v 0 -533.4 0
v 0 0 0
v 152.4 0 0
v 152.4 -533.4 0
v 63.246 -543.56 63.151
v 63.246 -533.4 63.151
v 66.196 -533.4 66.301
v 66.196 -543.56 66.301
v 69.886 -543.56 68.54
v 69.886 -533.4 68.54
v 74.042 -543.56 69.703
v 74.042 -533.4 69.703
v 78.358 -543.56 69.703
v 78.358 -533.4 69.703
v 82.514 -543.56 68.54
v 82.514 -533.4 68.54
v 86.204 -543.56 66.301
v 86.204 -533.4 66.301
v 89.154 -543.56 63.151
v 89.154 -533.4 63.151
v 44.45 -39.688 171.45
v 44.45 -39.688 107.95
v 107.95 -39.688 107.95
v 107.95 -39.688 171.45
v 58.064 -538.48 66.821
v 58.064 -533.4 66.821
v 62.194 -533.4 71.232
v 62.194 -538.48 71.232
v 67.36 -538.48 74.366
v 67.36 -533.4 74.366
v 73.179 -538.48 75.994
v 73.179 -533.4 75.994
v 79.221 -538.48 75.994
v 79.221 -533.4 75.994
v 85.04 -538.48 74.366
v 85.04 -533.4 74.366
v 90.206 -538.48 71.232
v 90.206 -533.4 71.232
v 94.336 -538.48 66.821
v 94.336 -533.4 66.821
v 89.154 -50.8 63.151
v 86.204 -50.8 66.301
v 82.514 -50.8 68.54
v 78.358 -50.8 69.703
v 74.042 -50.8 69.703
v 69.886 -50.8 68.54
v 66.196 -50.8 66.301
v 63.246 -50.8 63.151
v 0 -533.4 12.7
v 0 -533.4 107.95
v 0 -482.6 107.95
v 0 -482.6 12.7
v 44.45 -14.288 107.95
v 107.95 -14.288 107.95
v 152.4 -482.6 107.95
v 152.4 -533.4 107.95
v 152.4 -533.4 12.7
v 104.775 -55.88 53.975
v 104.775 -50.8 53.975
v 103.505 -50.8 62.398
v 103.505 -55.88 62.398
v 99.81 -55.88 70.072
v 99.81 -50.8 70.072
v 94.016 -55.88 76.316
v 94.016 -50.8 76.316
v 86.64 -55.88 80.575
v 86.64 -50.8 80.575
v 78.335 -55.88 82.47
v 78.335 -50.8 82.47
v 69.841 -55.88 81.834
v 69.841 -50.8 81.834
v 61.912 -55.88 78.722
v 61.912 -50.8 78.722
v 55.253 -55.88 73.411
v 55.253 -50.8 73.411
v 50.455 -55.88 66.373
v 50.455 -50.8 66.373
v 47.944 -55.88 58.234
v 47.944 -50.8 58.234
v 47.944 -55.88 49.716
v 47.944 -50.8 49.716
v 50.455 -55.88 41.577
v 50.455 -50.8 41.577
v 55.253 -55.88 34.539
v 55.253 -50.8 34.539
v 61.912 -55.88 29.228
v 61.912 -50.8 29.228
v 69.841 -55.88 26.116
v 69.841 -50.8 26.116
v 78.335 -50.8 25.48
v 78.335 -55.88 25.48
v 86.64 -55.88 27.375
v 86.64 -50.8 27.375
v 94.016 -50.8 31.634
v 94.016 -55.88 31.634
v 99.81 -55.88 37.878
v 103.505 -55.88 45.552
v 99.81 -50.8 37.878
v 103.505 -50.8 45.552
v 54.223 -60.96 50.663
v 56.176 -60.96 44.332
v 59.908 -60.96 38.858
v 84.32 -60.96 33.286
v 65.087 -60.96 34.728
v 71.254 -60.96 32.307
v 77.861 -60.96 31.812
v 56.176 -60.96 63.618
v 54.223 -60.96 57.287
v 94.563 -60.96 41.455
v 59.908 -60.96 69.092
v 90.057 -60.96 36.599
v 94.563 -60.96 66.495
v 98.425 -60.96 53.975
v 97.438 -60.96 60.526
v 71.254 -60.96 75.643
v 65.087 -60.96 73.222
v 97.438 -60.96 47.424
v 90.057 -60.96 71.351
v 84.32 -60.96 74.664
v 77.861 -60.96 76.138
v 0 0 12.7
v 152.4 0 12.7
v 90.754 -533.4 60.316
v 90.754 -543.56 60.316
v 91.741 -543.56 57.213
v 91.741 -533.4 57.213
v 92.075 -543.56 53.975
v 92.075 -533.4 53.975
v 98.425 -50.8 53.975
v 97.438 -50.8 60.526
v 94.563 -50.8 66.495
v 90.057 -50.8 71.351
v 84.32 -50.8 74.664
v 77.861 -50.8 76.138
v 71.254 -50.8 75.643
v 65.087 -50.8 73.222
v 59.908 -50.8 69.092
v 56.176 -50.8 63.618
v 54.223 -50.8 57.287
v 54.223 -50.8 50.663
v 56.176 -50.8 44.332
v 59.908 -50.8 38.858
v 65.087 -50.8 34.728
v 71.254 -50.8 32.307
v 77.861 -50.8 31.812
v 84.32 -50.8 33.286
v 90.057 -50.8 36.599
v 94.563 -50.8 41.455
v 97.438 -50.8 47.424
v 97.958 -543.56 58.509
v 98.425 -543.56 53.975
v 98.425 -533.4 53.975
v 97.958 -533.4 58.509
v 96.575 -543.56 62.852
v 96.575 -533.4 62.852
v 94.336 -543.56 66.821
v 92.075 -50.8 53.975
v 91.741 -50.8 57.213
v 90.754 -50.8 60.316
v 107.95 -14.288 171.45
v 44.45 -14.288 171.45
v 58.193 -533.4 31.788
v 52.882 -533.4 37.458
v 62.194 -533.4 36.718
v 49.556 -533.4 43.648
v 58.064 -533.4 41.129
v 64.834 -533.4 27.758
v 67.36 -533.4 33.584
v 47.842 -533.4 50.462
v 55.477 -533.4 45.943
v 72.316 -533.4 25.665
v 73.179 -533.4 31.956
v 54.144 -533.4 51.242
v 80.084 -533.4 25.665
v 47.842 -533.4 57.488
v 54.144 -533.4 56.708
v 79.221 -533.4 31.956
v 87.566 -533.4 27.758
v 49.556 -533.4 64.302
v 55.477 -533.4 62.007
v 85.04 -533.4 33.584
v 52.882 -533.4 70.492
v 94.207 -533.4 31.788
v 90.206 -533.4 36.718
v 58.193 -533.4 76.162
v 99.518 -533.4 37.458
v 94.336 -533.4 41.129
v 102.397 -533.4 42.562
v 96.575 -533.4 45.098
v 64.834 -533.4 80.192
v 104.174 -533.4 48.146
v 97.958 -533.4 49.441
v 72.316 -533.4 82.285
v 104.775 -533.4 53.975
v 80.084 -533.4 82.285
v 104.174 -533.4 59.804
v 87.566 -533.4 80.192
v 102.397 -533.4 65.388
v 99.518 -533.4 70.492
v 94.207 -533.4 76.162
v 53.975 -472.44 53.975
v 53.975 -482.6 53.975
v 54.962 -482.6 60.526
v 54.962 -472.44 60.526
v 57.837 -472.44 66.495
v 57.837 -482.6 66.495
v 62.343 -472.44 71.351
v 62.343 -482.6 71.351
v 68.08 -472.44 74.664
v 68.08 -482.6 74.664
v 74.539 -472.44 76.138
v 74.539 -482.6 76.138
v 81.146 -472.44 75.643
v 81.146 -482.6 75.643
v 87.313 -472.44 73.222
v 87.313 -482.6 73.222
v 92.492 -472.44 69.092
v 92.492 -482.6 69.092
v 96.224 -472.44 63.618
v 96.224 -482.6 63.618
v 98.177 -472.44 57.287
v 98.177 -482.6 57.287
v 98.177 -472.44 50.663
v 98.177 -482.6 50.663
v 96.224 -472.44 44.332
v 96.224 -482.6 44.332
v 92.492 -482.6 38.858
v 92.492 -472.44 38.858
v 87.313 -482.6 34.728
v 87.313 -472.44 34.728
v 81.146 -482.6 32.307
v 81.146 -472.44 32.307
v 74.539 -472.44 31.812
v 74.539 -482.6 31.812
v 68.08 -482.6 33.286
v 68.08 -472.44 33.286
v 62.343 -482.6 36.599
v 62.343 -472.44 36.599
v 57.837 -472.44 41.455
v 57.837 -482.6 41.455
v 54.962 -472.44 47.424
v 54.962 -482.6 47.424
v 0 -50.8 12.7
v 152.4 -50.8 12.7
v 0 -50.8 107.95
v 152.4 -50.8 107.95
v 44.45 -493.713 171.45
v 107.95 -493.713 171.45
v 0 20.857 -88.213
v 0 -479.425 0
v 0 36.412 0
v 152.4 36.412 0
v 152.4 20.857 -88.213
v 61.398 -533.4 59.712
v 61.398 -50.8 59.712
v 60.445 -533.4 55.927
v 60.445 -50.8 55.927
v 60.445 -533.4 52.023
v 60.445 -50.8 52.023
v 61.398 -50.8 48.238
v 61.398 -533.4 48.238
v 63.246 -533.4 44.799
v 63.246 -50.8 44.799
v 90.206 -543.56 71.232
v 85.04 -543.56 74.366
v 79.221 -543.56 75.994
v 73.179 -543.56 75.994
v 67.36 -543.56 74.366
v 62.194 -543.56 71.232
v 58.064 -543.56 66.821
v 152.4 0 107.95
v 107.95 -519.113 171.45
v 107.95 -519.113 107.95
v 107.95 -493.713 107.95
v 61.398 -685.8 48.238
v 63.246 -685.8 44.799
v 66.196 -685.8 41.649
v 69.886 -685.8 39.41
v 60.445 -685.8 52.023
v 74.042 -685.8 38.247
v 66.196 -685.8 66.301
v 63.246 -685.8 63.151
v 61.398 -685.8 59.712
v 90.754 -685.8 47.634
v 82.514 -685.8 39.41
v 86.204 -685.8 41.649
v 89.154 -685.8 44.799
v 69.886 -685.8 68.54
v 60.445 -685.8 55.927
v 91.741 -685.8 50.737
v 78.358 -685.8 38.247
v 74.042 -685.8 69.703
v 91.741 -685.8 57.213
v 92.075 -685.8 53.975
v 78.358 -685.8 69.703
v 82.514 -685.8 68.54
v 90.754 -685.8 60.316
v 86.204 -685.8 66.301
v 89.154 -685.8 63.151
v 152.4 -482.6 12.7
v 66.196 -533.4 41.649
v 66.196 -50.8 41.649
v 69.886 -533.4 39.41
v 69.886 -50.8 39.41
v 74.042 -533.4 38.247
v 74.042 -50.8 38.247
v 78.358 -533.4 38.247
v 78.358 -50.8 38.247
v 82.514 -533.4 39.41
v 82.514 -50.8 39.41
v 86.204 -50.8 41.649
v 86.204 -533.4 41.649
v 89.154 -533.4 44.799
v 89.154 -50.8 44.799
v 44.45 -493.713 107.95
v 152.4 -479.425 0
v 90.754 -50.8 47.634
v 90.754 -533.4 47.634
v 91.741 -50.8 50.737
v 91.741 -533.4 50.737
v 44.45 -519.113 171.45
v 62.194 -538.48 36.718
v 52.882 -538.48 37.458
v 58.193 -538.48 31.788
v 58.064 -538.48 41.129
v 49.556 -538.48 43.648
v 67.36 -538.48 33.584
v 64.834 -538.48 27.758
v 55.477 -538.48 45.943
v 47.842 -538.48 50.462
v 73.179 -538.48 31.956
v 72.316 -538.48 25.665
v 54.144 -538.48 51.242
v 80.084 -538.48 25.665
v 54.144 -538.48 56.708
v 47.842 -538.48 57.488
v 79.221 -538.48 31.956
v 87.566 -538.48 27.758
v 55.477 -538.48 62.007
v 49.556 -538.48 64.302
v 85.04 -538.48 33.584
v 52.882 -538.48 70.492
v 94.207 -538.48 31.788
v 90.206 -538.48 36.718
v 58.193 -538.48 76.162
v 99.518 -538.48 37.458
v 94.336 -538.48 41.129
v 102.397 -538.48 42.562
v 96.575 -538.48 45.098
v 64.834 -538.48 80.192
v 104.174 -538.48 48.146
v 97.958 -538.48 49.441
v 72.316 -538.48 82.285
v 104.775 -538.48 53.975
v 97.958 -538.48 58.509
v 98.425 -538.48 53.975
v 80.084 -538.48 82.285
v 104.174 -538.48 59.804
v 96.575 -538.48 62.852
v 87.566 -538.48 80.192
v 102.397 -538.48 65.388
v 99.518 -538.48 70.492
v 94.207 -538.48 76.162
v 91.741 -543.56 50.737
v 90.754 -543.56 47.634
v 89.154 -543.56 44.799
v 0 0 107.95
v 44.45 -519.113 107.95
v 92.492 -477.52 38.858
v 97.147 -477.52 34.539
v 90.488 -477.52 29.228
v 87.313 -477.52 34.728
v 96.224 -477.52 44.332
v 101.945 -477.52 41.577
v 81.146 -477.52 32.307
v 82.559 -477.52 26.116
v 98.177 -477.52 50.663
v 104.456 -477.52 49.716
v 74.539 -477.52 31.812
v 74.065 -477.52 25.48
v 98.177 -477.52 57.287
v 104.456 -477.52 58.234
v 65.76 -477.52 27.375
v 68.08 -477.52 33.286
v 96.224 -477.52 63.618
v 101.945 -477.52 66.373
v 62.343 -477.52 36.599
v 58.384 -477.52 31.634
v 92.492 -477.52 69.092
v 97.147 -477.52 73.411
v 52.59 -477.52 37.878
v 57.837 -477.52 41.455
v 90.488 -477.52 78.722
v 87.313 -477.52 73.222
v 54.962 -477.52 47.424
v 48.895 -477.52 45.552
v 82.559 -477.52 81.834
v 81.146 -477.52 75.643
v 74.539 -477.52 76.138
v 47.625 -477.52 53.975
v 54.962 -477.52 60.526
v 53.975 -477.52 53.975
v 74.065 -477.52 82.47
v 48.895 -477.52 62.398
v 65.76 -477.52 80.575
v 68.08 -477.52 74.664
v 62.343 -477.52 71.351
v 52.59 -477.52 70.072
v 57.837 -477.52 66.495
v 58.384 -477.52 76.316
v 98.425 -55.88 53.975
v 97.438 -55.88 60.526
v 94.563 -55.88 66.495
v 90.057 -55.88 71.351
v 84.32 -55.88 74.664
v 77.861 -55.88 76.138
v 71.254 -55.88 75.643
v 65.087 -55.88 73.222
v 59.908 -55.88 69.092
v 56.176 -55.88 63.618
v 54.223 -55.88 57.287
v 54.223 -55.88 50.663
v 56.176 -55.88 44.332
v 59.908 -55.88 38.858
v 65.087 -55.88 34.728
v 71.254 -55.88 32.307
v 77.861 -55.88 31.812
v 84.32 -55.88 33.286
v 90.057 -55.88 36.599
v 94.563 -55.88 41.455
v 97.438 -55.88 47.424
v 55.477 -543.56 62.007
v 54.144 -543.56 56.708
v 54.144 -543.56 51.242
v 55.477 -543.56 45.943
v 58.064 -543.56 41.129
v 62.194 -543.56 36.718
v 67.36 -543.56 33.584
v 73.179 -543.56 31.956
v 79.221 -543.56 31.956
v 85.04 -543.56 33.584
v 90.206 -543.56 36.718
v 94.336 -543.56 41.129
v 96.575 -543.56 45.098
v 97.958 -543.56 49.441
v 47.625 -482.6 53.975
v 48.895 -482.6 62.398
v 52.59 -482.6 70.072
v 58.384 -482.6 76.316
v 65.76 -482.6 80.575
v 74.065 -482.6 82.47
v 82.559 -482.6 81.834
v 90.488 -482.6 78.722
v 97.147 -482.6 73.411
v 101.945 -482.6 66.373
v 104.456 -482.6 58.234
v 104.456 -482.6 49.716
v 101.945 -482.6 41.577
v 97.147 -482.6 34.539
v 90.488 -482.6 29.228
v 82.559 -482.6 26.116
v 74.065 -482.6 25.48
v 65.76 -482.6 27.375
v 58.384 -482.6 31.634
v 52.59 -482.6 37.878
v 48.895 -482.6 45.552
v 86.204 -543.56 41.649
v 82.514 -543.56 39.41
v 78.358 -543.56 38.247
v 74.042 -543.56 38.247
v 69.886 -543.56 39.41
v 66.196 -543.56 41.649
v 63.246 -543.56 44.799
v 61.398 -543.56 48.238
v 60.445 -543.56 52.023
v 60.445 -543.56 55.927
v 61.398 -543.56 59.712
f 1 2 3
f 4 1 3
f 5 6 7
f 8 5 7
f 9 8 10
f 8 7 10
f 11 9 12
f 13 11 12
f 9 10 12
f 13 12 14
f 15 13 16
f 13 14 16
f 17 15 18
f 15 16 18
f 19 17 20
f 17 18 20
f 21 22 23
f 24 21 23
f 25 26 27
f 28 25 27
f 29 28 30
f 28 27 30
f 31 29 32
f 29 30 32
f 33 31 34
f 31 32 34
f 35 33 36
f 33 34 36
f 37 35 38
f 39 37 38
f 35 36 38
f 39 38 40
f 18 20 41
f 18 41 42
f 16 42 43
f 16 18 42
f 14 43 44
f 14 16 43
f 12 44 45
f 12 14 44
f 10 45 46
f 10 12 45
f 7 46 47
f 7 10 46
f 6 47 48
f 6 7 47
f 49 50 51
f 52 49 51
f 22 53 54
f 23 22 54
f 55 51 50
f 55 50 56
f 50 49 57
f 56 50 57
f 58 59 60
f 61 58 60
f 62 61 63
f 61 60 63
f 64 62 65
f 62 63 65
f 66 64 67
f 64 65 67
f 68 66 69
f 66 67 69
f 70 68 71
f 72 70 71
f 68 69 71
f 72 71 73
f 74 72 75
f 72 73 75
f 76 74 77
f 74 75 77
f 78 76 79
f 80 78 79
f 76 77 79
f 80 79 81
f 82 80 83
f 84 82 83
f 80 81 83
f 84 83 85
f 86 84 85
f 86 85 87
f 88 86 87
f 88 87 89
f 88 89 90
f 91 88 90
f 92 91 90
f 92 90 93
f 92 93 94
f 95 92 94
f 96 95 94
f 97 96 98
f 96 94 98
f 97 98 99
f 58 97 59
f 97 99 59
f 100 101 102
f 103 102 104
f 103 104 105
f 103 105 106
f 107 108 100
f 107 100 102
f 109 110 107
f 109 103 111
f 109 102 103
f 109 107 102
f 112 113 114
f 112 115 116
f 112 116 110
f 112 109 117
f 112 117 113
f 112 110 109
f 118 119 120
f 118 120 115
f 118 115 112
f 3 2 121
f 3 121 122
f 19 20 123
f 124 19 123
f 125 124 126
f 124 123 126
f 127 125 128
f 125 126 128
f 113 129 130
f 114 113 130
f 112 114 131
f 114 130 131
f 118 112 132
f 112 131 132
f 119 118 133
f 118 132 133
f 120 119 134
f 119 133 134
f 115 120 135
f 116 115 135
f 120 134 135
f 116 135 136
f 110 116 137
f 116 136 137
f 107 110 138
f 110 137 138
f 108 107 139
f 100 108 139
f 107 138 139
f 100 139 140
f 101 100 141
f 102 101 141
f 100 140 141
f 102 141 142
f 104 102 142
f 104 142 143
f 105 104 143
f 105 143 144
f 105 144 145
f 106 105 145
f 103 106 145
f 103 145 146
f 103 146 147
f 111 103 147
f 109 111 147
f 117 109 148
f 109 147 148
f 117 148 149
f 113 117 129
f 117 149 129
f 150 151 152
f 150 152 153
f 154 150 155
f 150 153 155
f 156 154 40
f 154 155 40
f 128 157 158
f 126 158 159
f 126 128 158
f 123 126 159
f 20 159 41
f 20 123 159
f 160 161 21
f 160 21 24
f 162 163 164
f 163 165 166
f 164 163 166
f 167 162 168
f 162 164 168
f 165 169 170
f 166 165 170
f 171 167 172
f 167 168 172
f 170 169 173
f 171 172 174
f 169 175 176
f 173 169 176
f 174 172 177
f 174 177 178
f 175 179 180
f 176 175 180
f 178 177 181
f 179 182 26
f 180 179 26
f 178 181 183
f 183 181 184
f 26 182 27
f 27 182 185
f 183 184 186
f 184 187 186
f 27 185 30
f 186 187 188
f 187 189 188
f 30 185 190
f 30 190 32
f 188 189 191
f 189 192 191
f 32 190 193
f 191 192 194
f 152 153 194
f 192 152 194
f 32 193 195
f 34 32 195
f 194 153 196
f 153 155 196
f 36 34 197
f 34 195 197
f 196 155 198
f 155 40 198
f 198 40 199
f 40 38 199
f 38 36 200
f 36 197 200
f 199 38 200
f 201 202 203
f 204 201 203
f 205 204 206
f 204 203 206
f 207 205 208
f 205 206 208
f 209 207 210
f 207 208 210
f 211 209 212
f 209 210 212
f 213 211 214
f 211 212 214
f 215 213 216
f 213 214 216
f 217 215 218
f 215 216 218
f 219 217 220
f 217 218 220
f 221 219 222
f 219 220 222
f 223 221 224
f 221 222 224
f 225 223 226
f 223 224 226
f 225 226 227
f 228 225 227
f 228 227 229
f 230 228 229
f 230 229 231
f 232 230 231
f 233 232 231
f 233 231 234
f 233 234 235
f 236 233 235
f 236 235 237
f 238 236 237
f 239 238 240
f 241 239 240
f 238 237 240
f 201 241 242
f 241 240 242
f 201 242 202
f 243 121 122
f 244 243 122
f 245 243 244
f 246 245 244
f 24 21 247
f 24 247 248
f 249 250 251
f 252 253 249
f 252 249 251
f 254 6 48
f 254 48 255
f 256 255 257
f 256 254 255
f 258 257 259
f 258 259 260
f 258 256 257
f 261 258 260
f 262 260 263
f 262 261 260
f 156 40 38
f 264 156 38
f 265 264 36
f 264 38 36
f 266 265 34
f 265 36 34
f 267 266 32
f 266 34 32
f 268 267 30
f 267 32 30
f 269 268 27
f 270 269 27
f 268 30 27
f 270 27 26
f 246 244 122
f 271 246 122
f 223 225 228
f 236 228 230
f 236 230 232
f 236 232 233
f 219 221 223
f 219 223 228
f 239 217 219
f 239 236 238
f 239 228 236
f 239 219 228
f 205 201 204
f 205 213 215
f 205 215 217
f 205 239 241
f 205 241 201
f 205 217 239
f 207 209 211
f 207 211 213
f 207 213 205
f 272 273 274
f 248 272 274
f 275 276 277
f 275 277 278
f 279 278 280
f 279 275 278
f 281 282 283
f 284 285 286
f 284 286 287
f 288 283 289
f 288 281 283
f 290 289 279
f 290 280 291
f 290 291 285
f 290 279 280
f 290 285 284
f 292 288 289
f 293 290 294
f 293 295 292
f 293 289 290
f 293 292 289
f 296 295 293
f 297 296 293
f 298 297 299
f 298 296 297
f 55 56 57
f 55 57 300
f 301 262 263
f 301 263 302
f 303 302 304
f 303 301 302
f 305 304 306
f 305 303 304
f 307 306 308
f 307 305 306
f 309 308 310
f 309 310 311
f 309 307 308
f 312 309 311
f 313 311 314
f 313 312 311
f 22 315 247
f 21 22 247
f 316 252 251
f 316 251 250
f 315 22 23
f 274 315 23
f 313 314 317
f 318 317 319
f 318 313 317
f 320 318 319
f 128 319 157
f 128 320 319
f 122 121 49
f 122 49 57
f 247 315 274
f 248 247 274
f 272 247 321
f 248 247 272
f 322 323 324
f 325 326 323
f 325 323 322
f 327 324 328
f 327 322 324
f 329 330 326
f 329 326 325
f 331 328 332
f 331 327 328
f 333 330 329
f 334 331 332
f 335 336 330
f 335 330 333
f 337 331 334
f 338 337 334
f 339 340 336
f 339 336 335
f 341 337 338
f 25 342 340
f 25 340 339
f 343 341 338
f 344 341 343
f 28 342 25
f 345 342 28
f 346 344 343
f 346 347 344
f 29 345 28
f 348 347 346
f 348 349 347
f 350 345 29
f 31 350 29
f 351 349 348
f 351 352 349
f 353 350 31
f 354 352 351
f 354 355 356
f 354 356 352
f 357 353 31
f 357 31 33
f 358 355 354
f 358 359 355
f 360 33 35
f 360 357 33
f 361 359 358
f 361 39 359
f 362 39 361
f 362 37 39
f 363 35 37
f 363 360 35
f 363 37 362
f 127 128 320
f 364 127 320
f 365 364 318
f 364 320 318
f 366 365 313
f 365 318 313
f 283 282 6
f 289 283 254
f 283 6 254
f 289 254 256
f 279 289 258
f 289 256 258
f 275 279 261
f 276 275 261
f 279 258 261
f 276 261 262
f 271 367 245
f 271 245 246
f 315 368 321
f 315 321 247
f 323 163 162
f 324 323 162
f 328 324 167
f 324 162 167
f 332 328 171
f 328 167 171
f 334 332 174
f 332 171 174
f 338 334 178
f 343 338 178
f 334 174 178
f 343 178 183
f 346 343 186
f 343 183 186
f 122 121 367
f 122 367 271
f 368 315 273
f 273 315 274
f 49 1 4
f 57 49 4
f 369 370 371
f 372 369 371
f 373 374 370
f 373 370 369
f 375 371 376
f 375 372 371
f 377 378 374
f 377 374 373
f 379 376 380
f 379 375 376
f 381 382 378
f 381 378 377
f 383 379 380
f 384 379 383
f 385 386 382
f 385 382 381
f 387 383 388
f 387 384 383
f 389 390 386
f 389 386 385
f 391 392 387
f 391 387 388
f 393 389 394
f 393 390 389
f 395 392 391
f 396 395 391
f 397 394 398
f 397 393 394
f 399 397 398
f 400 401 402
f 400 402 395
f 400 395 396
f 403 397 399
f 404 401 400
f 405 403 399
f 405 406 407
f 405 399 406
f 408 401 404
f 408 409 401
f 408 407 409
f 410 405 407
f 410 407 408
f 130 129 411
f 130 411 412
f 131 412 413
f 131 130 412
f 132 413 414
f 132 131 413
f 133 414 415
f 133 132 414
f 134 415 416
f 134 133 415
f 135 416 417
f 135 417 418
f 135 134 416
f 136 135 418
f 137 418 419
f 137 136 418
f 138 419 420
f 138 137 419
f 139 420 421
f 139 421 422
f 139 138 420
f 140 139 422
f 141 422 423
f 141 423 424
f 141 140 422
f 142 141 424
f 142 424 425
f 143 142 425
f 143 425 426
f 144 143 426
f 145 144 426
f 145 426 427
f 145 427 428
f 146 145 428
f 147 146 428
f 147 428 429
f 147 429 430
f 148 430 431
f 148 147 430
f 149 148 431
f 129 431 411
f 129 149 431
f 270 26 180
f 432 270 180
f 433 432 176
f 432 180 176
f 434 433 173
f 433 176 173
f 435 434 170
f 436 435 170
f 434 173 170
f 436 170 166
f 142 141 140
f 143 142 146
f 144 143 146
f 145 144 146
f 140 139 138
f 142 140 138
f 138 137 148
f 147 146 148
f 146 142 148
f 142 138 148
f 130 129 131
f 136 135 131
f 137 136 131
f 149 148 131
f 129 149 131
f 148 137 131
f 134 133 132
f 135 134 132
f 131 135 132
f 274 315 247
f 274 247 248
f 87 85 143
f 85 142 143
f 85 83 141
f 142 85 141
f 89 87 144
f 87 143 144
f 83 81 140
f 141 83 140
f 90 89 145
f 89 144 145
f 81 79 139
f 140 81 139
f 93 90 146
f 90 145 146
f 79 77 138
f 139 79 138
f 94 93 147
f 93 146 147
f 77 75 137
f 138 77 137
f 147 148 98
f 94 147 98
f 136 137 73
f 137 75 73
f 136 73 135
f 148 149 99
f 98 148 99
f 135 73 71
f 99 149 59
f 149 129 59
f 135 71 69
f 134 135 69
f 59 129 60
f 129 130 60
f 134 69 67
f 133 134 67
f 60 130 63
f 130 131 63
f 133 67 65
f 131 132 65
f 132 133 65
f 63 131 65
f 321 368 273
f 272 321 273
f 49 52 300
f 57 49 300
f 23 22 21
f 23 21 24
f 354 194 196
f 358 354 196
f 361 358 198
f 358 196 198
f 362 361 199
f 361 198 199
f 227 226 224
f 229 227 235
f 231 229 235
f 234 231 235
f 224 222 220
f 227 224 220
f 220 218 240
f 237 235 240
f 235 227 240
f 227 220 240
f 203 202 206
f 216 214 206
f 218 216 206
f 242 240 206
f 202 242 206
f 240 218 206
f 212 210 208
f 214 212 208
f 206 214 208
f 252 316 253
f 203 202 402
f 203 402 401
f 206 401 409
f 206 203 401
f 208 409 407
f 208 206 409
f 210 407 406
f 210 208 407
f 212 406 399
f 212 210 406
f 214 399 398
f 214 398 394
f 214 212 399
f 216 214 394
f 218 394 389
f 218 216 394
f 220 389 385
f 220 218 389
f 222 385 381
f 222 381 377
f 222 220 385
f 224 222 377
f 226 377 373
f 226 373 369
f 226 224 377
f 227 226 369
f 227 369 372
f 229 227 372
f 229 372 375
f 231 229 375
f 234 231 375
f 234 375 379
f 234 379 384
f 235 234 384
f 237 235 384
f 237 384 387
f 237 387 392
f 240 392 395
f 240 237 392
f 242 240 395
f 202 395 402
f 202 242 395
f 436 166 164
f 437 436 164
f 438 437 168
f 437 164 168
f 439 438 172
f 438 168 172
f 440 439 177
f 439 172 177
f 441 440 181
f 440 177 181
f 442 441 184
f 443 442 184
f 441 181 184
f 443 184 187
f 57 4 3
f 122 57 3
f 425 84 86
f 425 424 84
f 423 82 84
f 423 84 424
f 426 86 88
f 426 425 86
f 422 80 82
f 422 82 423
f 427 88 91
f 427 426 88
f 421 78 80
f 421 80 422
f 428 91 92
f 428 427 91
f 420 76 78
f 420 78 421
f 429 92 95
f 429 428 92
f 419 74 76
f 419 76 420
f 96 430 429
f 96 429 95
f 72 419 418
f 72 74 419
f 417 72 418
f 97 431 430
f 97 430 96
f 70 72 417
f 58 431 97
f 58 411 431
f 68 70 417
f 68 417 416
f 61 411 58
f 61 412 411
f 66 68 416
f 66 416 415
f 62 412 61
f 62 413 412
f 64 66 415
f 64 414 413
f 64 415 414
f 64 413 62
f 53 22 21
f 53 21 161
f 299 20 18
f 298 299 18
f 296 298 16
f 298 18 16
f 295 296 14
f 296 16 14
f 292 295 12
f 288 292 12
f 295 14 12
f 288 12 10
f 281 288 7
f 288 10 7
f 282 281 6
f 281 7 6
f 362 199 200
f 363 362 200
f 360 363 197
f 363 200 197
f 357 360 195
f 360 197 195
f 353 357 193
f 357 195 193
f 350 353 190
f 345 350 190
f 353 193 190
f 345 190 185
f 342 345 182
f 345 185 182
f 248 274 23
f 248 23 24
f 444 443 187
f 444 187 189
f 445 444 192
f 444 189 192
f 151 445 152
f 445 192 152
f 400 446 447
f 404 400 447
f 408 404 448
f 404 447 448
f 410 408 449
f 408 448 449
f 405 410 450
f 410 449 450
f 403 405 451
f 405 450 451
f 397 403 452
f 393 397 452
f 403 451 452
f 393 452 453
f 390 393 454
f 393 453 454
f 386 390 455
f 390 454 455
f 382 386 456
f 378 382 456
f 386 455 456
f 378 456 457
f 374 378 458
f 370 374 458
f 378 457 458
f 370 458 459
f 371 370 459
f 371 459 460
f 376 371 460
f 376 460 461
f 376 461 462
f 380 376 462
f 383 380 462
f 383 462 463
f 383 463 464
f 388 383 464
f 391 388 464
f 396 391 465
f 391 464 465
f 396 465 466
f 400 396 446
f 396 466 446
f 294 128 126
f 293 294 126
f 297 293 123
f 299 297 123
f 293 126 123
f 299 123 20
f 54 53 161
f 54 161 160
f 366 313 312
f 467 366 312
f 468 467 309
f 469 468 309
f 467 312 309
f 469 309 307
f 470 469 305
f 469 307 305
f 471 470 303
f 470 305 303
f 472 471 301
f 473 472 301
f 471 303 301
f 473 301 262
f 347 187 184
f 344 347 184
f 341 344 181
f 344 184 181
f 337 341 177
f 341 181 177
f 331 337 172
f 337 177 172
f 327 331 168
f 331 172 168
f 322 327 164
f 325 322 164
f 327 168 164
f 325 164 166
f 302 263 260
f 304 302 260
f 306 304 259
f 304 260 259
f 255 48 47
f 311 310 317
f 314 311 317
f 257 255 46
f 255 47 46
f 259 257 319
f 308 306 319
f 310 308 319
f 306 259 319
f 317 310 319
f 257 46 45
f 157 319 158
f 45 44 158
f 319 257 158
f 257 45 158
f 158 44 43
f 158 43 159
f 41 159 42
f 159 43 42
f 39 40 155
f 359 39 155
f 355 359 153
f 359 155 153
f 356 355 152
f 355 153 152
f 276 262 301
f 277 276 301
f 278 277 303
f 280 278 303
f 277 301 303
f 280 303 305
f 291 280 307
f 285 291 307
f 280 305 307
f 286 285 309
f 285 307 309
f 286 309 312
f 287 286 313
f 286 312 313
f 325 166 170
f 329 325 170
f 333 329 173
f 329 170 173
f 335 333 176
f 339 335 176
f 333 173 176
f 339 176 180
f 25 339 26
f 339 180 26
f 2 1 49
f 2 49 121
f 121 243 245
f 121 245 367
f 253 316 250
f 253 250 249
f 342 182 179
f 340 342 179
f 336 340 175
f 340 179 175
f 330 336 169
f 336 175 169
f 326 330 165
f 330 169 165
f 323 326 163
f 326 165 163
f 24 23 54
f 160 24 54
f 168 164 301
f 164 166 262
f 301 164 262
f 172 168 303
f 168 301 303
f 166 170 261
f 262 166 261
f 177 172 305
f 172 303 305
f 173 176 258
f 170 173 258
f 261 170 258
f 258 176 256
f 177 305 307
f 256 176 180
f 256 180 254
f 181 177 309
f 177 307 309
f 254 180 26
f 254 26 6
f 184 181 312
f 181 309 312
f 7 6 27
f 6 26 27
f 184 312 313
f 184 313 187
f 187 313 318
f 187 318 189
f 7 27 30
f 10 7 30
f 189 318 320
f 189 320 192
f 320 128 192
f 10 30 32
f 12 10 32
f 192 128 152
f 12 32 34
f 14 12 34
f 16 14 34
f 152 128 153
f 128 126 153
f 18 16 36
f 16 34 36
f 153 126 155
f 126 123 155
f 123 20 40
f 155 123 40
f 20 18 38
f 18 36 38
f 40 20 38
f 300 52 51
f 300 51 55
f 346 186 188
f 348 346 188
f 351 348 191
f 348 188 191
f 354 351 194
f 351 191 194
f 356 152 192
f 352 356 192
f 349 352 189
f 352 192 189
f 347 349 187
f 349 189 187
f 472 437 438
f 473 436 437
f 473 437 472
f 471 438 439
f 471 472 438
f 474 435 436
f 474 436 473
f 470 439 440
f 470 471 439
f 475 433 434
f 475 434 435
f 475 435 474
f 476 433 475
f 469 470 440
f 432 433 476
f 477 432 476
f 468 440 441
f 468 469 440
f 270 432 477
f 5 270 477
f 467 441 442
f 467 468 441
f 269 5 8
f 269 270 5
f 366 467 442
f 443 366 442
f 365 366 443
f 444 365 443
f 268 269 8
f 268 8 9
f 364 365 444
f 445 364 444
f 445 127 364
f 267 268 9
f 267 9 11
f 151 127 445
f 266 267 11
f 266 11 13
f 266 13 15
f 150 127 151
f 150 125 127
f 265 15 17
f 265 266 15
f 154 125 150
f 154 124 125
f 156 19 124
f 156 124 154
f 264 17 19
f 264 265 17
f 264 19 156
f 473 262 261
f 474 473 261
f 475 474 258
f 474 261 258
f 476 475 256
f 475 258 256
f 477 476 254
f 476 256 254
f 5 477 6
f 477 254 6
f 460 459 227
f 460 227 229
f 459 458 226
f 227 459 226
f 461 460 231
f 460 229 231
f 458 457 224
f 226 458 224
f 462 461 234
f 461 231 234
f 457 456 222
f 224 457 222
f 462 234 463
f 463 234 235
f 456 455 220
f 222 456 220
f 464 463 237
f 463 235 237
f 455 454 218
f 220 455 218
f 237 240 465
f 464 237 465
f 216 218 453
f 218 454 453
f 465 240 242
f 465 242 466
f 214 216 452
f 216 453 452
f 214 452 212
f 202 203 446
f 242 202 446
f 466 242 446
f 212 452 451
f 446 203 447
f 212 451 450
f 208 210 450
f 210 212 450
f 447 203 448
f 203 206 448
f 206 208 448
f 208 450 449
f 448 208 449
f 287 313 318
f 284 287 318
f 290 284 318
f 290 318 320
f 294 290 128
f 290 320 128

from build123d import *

# Parameters (mm, degrees)
F0_W          = 152.4
F0_H          = 533.4
F1_DEPTH      = 12.7
F2_W          = 152.4
F2_H          = 50.8
F3_DEPTH      = 95.25
F4_W          = 63.5
F4_H          = 25.4
F5_DEPTH      = 63.5
F7_DEPTH      = 482.6
F7_DEPTH_BACK = 152.4
F8_R          = 22.225
F9_DEPTH      = 10.16
F8_R_2        = 28.575
F10_DEPTH     = 5.08
F11_DEPTH     = 10.16
F12_DEPTH     = 5.08
F13_R         = 22.225
F14_DEPTH     = 10.16
F13_R_2       = 28.575
F15_DEPTH     = 5.08
F16_DEPTH     = 454.025
F18_DEPTH     = 152.4


with BuildPart() as f1:
    # F0 (on Top) → F1 (new body)
    with BuildSketch(Plane.XY):
        with Locations((76.2, -266.7)):
            Rectangle(F0_W, F0_H)
    extrude(amount=F1_DEPTH)


with BuildPart() as f3:
    # F2 (on face) → F3 (new body)
    with BuildSketch(Plane.XY.offset(12.7)):
        with Locations((76.2, -25.4)):
            Rectangle(F2_W, F2_H)
    extrude(amount=F3_DEPTH)


with BuildPart() as f3b:
    # F2 (on face) → F3, piece 2 (new body)
    with BuildSketch(Plane.XY.offset(12.7)):
        with Locations((76.2, -508)):
            Rectangle(F2_W, F2_H)
    extrude(amount=F3_DEPTH)


with BuildPart() as f5:
    # F4 (on face) → F5 (new body)
    with BuildSketch(Plane.XY.offset(107.95)):
        with Locations((76.2, -506.4125)):
            Rectangle(F4_W, F4_H)
    extrude(amount=F5_DEPTH)


with BuildPart() as f5b:
    # F4 (on face) → F5, piece 2 (new body)
    with BuildSketch(Plane.XY.offset(107.95)):
        with Locations((76.2, -26.9875)):
            Rectangle(F4_W, F4_H)
    extrude(amount=F5_DEPTH)


with BuildPart() as f7:
    # F6 (on face) → F7 (new body, two sides)
    with BuildSketch(Plane.XZ.offset(533.4)) as f7_sk:
        with BuildLine():
            ThreePointArc((63.2456113625, 63.1510252849), (60.325, 53.975), (63.2456113625, 44.7989747151))
            Line((63.2456113625, 44.7989747151), (76.2, 53.975))
            Line((76.2, 53.975), (63.2456113625, 63.1510252849))
        make_face()
        with BuildLine():
            Line((76.2, 53.975), (63.2456113625, 44.7989747151))
            ThreePointArc((63.2456113625, 44.7989747151), (76.2, 38.1), (89.1543886375, 44.7989747151))
            Line((89.1543886375, 44.7989747151), (76.2, 53.975))
        make_face()
        with BuildLine():
            Line((63.2456113625, 63.1510252849), (76.2, 53.975))
            Line((76.2, 53.975), (89.1543886375, 63.1510252849))
            ThreePointArc((89.1543886375, 63.1510252849), (76.2, 69.85), (63.2456113625, 63.1510252849))
        make_face()
        with BuildLine():
            Line((89.1543886375, 63.1510252849), (76.2, 53.975))
            Line((76.2, 53.975), (89.1543886375, 44.7989747151))
            ThreePointArc((89.1543886375, 44.7989747151), (91.3272361094, 49.1601944286), (92.075, 53.975))
            ThreePointArc((92.075, 53.975), (91.3272361094, 58.7898055714), (89.1543886375, 63.1510252849))
        make_face()
    extrude(amount=-F7_DEPTH)
    extrude(f7_sk.sketch, amount=F7_DEPTH_BACK)


with BuildPart() as f9:
    # F8 (on face) → F9 (new body)
    with BuildSketch(Plane.XZ.offset(50.8)):
        with Locations((76.2, 53.975)):
            Circle(F8_R)
    extrude(amount=F9_DEPTH)


with BuildPart() as f10:
    # F8 (on face) → F10 (new body)
    with BuildSketch(Plane.XZ.offset(50.8)):
        with Locations((76.2, 53.975)):
            Circle(F8_R_2)
        with Locations((76.2, 53.975)):
            Circle(F8_R, mode=Mode.SUBTRACT)
    extrude(amount=F10_DEPTH)


with BuildPart() as f11:
    # F6 (on face) → F11 (new body)
    with BuildSketch(Plane.XZ.offset(533.4)):
        with BuildLine():
            Line((63.2456113625, 44.7989747151), (58.0638559075, 41.1285646012))
            ThreePointArc((58.0638559075, 41.1285646012), (76.2, 31.75), (94.3361440925, 41.1285646012))
            Line((94.3361440925, 41.1285646012), (89.1543886375, 44.7989747151))
            ThreePointArc((89.1543886375, 44.7989747151), (76.2, 38.1), (63.2456113625, 44.7989747151))
        make_face()
        with BuildLine():
            ThreePointArc((58.0638559075, 66.8214353988), (53.975, 53.975), (58.0638559075, 41.1285646012))
            Line((58.0638559075, 41.1285646012), (63.2456113625, 44.7989747151))
            ThreePointArc((63.2456113625, 44.7989747151), (60.325, 53.975), (63.2456113625, 63.1510252849))
            Line((63.2456113625, 63.1510252849), (58.0638559075, 66.8214353988))
        make_face()
        with BuildLine():
            ThreePointArc((94.3361440925, 66.8214353988), (76.2, 76.2), (58.0638559075, 66.8214353988))
            Line((58.0638559075, 66.8214353988), (63.2456113625, 63.1510252849))
            ThreePointArc((63.2456113625, 63.1510252849), (76.2, 69.85), (89.1543886375, 63.1510252849))
            Line((89.1543886375, 63.1510252849), (94.3361440925, 66.8214353988))
        make_face()
        with BuildLine():
            Line((89.1543886375, 44.7989747151), (94.3361440925, 41.1285646012))
            ThreePointArc((94.3361440925, 41.1285646012), (97.3781305532, 47.2342722001), (98.425, 53.975))
            ThreePointArc((98.425, 53.975), (97.3781305532, 60.7157277999), (94.3361440925, 66.8214353988))
            Line((94.3361440925, 66.8214353988), (89.1543886375, 63.1510252849))
            ThreePointArc((89.1543886375, 63.1510252849), (91.3272361094, 58.7898055714), (92.075, 53.975))
            ThreePointArc((92.075, 53.975), (91.3272361094, 49.1601944286), (89.1543886375, 44.7989747151))
        make_face()
    extrude(amount=F11_DEPTH)


with BuildPart() as f12:
    # F6 (on face) → F12 (new body)
    with BuildSketch(Plane.XZ.offset(533.4)):
        with BuildLine():
            ThreePointArc((99.5178995475, 70.4918455128), (76.2, 82.55), (52.8821004525, 70.4918455128))
            Line((52.8821004525, 70.4918455128), (58.0638559075, 66.8214353988))
            ThreePointArc((58.0638559075, 66.8214353988), (76.2, 76.2), (94.3361440925, 66.8214353988))
            Line((94.3361440925, 66.8214353988), (99.5178995475, 70.4918455128))
        make_face()
        with BuildLine():
            ThreePointArc((52.8821004525, 70.4918455128), (47.625, 53.975), (52.8821004525, 37.4581544872))
            Line((52.8821004525, 37.4581544872), (58.0638559075, 41.1285646012))
            ThreePointArc((58.0638559075, 41.1285646012), (53.975, 53.975), (58.0638559075, 66.8214353988))
            Line((58.0638559075, 66.8214353988), (52.8821004525, 70.4918455128))
        make_face()
        with BuildLine():
            Line((58.0638559075, 41.1285646012), (52.8821004525, 37.4581544872))
            ThreePointArc((52.8821004525, 37.4581544872), (76.2, 25.4), (99.5178995475, 37.4581544872))
            Line((99.5178995475, 37.4581544872), (94.3361440925, 41.1285646012))
            ThreePointArc((94.3361440925, 41.1285646012), (76.2, 31.75), (58.0638559075, 41.1285646012))
        make_face()
        with BuildLine():
            Line((94.3361440925, 41.1285646012), (99.5178995475, 37.4581544872))
            ThreePointArc((99.5178995475, 37.4581544872), (103.429024997, 45.3083499716), (104.775, 53.975))
            ThreePointArc((104.775, 53.975), (103.429024997, 62.6416500284), (99.5178995475, 70.4918455128))
            Line((99.5178995475, 70.4918455128), (94.3361440925, 66.8214353988))
            ThreePointArc((94.3361440925, 66.8214353988), (97.3781305532, 60.7157277999), (98.425, 53.975))
            ThreePointArc((98.425, 53.975), (97.3781305532, 47.2342722001), (94.3361440925, 41.1285646012))
        make_face()
    extrude(amount=F12_DEPTH)


with BuildPart() as f14:
    # F13 (on face) → F14 (new body)
    with BuildSketch(Plane(origin=(0, -482.6, 0), x_dir=(-1, 0, 0), z_dir=(0, 1, 0))):
        with Locations((-76.2, 53.975)):
            Circle(F13_R)
    extrude(amount=F14_DEPTH)


with BuildPart() as f15:
    # F13 (on face) → F15 (new body)
    with BuildSketch(Plane(origin=(0, -482.6, 0), x_dir=(-1, 0, 0), z_dir=(0, 1, 0))):
        with Locations((-76.2, 53.975)):
            Circle(F13_R_2)
        with Locations((-76.2, 53.975)):
            Circle(F13_R, mode=Mode.SUBTRACT)
    extrude(amount=F15_DEPTH)


with BuildPart() as f16:
    # F16 (new, through all): a face of the model
    f16_faces = [f5.part.faces().sort_by_distance(p)[0] for p in [
        (76.2, -493.7125, 139.7),
    ]]
    extrude(f16_faces, amount=F16_DEPTH)


with BuildPart() as f18:
    # F17 (on face) → F18 (new body)
    with BuildSketch(Plane.YZ.offset(152.4)):
        Polygon((0, 0), (-479.425, 0), (20.8573385302, -88.2132742548), (36.411718838, 0), align=None)
    extrude(amount=-F18_DEPTH)


solid = Compound([f1.part, f3.part, f3b.part, f5.part, f5b.part, f7.part, f9.part, f10.part, f11.part, f12.part, f14.part, f15.part, f16.part, f18.part])
